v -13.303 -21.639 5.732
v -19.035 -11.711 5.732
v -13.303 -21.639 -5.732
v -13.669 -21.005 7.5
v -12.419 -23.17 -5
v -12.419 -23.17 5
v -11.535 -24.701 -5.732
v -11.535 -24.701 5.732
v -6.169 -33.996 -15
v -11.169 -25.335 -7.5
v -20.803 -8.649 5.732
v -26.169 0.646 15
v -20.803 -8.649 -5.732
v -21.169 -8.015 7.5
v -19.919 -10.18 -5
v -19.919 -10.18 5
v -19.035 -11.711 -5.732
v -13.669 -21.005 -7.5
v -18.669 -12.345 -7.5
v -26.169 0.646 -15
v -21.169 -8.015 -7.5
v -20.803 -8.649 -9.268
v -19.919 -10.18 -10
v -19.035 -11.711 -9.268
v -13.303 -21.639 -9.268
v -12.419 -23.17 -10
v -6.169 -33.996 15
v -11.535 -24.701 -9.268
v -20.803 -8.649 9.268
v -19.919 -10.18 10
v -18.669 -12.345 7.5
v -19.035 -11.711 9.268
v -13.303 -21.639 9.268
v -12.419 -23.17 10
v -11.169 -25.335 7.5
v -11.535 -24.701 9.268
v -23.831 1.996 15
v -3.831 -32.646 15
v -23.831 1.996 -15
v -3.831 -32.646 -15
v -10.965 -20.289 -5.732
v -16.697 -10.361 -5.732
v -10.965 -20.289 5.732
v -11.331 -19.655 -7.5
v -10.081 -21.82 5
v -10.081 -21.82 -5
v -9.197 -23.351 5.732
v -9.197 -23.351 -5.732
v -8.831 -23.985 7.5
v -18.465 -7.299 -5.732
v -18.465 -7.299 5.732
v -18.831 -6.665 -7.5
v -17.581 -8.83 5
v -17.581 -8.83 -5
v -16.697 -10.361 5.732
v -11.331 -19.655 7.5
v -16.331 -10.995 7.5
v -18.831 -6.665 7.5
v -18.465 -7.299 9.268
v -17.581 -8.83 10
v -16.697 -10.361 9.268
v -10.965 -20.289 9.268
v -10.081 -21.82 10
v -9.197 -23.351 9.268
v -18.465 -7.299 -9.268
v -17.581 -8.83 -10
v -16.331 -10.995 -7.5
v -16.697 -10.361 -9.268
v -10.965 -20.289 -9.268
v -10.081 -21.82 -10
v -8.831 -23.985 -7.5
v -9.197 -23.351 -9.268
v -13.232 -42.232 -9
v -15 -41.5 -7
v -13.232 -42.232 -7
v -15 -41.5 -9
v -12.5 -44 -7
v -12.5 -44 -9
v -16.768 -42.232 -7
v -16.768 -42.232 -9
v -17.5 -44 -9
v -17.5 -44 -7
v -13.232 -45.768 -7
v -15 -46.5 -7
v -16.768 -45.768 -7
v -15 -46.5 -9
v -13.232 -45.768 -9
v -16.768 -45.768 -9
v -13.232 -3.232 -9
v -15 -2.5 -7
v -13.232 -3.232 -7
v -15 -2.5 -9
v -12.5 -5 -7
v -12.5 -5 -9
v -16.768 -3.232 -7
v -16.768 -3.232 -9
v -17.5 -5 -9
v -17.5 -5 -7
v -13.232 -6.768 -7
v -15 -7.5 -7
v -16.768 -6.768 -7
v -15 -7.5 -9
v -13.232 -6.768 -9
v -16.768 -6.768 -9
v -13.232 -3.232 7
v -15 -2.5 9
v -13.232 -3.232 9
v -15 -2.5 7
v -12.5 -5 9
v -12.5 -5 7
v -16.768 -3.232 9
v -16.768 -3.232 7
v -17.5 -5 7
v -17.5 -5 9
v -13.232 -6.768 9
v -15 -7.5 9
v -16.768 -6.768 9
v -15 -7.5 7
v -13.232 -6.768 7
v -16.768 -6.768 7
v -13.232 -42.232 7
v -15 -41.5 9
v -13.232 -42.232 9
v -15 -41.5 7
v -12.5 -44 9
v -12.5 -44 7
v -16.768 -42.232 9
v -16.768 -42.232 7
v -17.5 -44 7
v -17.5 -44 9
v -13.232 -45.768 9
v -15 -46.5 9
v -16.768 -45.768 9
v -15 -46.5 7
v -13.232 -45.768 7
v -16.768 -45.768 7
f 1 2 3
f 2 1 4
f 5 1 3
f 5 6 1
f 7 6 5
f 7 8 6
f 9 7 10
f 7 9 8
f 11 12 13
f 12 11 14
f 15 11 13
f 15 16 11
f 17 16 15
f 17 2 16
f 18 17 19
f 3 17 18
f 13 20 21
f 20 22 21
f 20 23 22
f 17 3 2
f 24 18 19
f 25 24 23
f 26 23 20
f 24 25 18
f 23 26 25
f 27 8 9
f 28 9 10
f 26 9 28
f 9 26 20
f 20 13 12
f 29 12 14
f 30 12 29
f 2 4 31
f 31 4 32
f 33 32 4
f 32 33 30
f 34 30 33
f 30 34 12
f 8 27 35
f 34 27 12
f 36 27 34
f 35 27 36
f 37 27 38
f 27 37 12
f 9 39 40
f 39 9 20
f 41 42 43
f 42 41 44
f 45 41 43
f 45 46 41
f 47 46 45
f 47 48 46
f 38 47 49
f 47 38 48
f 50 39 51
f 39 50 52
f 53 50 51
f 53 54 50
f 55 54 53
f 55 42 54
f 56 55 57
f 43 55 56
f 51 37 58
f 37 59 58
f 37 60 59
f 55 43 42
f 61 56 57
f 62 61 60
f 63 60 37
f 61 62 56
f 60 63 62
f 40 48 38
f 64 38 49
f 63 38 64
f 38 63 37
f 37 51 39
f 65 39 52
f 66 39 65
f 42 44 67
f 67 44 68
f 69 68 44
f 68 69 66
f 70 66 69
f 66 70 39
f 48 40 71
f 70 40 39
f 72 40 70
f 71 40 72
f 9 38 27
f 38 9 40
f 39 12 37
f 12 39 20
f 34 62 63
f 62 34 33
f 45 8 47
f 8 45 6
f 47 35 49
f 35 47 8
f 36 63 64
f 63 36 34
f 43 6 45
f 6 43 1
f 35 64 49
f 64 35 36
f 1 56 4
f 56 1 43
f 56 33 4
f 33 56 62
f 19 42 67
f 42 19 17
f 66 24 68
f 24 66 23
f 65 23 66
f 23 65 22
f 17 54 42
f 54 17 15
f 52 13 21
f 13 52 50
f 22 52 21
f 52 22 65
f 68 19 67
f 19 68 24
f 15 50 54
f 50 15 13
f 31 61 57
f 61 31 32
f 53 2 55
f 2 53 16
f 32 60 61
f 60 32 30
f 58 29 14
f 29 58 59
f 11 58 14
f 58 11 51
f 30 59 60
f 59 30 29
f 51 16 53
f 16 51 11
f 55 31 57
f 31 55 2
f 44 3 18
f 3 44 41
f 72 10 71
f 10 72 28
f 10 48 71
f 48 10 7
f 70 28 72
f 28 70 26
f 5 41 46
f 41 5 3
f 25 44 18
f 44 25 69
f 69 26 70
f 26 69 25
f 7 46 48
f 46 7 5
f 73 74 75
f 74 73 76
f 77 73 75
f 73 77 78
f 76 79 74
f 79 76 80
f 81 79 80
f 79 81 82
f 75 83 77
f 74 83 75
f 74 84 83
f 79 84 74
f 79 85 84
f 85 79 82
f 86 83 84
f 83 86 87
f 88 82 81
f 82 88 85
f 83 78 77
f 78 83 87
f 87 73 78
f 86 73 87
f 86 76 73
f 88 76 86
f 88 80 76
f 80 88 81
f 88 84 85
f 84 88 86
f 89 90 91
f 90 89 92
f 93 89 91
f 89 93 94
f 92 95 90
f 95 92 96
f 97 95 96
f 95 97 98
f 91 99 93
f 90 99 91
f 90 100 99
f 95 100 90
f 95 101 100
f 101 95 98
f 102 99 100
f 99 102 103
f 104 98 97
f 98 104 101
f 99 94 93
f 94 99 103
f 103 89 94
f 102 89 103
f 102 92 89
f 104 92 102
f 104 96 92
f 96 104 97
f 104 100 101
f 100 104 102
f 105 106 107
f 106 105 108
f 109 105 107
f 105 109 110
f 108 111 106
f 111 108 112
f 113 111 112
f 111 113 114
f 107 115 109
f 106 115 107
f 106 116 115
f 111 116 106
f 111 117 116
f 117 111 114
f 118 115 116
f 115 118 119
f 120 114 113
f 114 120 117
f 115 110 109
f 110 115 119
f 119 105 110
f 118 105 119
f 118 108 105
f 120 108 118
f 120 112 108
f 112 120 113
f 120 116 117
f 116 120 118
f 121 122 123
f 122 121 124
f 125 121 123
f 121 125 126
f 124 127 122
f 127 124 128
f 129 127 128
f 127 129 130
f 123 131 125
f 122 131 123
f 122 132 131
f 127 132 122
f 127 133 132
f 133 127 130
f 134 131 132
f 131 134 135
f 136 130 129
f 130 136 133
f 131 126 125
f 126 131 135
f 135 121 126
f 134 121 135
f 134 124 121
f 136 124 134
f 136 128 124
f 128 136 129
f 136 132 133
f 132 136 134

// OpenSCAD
translate([-15,-16,0])rotate([0,0,-150])
difference (){
cube([2.7,40,30],center=true);
translate([0,7.5,7.5])rotate([0,90,0])cylinder(d=5, h=3, center=true);
translate([0,-7.5,-7.5])rotate([0,90,0])    
       cylinder(d=5, h=3, center=true);
     translate([0,-7.5,7.5])rotate([0,90,0])
        cylinder(d=5, h=3, center=true);
    translate([0,7.5,-7.5])rotate([0,90,0])
        cylinder(d=5, h=3, center=true);
    
};
translate([-15,-44,-8])   cylinder(d=5, h=2, center=true);
translate([-15,-5,-8]) cylinder(d=5, h=2, center=true);
      translate([-15,-5,8])
        cylinder(d=5, h=2, center=true);
     translate([-15,-44,8])
        cylinder(d=5, h=2, center=true);
